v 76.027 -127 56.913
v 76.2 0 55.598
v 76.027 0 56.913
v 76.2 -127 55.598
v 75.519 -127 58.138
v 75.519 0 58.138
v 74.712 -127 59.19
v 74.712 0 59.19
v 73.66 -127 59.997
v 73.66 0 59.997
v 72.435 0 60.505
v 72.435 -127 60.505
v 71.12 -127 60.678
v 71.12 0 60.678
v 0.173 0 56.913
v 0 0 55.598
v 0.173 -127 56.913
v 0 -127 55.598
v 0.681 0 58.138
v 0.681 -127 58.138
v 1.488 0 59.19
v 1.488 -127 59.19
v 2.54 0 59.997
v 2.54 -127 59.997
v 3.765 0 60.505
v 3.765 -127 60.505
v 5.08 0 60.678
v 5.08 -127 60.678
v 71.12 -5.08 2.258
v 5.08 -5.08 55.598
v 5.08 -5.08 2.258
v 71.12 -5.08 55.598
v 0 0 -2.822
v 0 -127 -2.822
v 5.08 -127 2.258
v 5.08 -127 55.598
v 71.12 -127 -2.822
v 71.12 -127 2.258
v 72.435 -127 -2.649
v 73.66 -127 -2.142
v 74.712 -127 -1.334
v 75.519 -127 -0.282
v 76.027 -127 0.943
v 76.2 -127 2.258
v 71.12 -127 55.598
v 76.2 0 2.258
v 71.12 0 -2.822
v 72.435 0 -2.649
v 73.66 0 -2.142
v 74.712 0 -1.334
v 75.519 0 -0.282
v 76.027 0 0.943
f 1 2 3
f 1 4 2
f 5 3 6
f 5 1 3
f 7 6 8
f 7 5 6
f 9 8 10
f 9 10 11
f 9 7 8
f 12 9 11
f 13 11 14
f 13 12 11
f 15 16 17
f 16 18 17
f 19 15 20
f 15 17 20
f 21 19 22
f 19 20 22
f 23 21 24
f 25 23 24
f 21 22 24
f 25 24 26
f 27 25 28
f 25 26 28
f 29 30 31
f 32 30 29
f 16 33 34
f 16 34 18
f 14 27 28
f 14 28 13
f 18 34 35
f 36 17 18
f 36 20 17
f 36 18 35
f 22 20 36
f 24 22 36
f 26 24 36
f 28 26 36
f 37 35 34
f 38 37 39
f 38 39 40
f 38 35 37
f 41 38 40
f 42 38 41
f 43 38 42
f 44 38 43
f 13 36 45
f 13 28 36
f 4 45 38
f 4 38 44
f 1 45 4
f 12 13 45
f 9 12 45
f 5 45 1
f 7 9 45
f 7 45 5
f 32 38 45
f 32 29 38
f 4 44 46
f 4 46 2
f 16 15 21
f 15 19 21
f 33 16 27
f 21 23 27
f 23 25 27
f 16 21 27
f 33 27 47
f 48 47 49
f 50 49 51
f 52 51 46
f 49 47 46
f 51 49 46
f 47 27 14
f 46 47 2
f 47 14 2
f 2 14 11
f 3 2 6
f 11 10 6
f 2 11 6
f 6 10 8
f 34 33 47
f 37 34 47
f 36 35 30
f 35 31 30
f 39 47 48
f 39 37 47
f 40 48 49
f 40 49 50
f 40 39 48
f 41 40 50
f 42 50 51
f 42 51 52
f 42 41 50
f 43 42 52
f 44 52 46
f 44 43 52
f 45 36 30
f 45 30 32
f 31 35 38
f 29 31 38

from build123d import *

# Parameters (mm, degrees)
F0_W     = 76.2
F0_H     = 63.5
F1_DEPTH = 127
F2_T     = -5.08
F3_R     = 5.08


with BuildPart() as f1:
    # F0 (on Front) → F1 (new body)
    with BuildSketch(Plane.XZ):
        with Locations((38.1, 28.927778)):
            Rectangle(F0_W, F0_H)
    extrude(amount=F1_DEPTH)

    # F2
    f2_openings = [f1.faces().sort_by_distance(p)[0] for p in [
        (38.1, -127, 28.927778),
    ]]
    offset(amount=F2_T, openings=f2_openings)

    # F3
    f3_edges = [f1.edges().sort_by_distance(p)[0] for p in [
        (76.2, -63.5, 60.677778),
        (0, -63.5, 60.677778),
        (76.2, -63.5, -2.822222),
    ]]
    fillet(f3_edges, radius=F3_R)


solid = f1.part
